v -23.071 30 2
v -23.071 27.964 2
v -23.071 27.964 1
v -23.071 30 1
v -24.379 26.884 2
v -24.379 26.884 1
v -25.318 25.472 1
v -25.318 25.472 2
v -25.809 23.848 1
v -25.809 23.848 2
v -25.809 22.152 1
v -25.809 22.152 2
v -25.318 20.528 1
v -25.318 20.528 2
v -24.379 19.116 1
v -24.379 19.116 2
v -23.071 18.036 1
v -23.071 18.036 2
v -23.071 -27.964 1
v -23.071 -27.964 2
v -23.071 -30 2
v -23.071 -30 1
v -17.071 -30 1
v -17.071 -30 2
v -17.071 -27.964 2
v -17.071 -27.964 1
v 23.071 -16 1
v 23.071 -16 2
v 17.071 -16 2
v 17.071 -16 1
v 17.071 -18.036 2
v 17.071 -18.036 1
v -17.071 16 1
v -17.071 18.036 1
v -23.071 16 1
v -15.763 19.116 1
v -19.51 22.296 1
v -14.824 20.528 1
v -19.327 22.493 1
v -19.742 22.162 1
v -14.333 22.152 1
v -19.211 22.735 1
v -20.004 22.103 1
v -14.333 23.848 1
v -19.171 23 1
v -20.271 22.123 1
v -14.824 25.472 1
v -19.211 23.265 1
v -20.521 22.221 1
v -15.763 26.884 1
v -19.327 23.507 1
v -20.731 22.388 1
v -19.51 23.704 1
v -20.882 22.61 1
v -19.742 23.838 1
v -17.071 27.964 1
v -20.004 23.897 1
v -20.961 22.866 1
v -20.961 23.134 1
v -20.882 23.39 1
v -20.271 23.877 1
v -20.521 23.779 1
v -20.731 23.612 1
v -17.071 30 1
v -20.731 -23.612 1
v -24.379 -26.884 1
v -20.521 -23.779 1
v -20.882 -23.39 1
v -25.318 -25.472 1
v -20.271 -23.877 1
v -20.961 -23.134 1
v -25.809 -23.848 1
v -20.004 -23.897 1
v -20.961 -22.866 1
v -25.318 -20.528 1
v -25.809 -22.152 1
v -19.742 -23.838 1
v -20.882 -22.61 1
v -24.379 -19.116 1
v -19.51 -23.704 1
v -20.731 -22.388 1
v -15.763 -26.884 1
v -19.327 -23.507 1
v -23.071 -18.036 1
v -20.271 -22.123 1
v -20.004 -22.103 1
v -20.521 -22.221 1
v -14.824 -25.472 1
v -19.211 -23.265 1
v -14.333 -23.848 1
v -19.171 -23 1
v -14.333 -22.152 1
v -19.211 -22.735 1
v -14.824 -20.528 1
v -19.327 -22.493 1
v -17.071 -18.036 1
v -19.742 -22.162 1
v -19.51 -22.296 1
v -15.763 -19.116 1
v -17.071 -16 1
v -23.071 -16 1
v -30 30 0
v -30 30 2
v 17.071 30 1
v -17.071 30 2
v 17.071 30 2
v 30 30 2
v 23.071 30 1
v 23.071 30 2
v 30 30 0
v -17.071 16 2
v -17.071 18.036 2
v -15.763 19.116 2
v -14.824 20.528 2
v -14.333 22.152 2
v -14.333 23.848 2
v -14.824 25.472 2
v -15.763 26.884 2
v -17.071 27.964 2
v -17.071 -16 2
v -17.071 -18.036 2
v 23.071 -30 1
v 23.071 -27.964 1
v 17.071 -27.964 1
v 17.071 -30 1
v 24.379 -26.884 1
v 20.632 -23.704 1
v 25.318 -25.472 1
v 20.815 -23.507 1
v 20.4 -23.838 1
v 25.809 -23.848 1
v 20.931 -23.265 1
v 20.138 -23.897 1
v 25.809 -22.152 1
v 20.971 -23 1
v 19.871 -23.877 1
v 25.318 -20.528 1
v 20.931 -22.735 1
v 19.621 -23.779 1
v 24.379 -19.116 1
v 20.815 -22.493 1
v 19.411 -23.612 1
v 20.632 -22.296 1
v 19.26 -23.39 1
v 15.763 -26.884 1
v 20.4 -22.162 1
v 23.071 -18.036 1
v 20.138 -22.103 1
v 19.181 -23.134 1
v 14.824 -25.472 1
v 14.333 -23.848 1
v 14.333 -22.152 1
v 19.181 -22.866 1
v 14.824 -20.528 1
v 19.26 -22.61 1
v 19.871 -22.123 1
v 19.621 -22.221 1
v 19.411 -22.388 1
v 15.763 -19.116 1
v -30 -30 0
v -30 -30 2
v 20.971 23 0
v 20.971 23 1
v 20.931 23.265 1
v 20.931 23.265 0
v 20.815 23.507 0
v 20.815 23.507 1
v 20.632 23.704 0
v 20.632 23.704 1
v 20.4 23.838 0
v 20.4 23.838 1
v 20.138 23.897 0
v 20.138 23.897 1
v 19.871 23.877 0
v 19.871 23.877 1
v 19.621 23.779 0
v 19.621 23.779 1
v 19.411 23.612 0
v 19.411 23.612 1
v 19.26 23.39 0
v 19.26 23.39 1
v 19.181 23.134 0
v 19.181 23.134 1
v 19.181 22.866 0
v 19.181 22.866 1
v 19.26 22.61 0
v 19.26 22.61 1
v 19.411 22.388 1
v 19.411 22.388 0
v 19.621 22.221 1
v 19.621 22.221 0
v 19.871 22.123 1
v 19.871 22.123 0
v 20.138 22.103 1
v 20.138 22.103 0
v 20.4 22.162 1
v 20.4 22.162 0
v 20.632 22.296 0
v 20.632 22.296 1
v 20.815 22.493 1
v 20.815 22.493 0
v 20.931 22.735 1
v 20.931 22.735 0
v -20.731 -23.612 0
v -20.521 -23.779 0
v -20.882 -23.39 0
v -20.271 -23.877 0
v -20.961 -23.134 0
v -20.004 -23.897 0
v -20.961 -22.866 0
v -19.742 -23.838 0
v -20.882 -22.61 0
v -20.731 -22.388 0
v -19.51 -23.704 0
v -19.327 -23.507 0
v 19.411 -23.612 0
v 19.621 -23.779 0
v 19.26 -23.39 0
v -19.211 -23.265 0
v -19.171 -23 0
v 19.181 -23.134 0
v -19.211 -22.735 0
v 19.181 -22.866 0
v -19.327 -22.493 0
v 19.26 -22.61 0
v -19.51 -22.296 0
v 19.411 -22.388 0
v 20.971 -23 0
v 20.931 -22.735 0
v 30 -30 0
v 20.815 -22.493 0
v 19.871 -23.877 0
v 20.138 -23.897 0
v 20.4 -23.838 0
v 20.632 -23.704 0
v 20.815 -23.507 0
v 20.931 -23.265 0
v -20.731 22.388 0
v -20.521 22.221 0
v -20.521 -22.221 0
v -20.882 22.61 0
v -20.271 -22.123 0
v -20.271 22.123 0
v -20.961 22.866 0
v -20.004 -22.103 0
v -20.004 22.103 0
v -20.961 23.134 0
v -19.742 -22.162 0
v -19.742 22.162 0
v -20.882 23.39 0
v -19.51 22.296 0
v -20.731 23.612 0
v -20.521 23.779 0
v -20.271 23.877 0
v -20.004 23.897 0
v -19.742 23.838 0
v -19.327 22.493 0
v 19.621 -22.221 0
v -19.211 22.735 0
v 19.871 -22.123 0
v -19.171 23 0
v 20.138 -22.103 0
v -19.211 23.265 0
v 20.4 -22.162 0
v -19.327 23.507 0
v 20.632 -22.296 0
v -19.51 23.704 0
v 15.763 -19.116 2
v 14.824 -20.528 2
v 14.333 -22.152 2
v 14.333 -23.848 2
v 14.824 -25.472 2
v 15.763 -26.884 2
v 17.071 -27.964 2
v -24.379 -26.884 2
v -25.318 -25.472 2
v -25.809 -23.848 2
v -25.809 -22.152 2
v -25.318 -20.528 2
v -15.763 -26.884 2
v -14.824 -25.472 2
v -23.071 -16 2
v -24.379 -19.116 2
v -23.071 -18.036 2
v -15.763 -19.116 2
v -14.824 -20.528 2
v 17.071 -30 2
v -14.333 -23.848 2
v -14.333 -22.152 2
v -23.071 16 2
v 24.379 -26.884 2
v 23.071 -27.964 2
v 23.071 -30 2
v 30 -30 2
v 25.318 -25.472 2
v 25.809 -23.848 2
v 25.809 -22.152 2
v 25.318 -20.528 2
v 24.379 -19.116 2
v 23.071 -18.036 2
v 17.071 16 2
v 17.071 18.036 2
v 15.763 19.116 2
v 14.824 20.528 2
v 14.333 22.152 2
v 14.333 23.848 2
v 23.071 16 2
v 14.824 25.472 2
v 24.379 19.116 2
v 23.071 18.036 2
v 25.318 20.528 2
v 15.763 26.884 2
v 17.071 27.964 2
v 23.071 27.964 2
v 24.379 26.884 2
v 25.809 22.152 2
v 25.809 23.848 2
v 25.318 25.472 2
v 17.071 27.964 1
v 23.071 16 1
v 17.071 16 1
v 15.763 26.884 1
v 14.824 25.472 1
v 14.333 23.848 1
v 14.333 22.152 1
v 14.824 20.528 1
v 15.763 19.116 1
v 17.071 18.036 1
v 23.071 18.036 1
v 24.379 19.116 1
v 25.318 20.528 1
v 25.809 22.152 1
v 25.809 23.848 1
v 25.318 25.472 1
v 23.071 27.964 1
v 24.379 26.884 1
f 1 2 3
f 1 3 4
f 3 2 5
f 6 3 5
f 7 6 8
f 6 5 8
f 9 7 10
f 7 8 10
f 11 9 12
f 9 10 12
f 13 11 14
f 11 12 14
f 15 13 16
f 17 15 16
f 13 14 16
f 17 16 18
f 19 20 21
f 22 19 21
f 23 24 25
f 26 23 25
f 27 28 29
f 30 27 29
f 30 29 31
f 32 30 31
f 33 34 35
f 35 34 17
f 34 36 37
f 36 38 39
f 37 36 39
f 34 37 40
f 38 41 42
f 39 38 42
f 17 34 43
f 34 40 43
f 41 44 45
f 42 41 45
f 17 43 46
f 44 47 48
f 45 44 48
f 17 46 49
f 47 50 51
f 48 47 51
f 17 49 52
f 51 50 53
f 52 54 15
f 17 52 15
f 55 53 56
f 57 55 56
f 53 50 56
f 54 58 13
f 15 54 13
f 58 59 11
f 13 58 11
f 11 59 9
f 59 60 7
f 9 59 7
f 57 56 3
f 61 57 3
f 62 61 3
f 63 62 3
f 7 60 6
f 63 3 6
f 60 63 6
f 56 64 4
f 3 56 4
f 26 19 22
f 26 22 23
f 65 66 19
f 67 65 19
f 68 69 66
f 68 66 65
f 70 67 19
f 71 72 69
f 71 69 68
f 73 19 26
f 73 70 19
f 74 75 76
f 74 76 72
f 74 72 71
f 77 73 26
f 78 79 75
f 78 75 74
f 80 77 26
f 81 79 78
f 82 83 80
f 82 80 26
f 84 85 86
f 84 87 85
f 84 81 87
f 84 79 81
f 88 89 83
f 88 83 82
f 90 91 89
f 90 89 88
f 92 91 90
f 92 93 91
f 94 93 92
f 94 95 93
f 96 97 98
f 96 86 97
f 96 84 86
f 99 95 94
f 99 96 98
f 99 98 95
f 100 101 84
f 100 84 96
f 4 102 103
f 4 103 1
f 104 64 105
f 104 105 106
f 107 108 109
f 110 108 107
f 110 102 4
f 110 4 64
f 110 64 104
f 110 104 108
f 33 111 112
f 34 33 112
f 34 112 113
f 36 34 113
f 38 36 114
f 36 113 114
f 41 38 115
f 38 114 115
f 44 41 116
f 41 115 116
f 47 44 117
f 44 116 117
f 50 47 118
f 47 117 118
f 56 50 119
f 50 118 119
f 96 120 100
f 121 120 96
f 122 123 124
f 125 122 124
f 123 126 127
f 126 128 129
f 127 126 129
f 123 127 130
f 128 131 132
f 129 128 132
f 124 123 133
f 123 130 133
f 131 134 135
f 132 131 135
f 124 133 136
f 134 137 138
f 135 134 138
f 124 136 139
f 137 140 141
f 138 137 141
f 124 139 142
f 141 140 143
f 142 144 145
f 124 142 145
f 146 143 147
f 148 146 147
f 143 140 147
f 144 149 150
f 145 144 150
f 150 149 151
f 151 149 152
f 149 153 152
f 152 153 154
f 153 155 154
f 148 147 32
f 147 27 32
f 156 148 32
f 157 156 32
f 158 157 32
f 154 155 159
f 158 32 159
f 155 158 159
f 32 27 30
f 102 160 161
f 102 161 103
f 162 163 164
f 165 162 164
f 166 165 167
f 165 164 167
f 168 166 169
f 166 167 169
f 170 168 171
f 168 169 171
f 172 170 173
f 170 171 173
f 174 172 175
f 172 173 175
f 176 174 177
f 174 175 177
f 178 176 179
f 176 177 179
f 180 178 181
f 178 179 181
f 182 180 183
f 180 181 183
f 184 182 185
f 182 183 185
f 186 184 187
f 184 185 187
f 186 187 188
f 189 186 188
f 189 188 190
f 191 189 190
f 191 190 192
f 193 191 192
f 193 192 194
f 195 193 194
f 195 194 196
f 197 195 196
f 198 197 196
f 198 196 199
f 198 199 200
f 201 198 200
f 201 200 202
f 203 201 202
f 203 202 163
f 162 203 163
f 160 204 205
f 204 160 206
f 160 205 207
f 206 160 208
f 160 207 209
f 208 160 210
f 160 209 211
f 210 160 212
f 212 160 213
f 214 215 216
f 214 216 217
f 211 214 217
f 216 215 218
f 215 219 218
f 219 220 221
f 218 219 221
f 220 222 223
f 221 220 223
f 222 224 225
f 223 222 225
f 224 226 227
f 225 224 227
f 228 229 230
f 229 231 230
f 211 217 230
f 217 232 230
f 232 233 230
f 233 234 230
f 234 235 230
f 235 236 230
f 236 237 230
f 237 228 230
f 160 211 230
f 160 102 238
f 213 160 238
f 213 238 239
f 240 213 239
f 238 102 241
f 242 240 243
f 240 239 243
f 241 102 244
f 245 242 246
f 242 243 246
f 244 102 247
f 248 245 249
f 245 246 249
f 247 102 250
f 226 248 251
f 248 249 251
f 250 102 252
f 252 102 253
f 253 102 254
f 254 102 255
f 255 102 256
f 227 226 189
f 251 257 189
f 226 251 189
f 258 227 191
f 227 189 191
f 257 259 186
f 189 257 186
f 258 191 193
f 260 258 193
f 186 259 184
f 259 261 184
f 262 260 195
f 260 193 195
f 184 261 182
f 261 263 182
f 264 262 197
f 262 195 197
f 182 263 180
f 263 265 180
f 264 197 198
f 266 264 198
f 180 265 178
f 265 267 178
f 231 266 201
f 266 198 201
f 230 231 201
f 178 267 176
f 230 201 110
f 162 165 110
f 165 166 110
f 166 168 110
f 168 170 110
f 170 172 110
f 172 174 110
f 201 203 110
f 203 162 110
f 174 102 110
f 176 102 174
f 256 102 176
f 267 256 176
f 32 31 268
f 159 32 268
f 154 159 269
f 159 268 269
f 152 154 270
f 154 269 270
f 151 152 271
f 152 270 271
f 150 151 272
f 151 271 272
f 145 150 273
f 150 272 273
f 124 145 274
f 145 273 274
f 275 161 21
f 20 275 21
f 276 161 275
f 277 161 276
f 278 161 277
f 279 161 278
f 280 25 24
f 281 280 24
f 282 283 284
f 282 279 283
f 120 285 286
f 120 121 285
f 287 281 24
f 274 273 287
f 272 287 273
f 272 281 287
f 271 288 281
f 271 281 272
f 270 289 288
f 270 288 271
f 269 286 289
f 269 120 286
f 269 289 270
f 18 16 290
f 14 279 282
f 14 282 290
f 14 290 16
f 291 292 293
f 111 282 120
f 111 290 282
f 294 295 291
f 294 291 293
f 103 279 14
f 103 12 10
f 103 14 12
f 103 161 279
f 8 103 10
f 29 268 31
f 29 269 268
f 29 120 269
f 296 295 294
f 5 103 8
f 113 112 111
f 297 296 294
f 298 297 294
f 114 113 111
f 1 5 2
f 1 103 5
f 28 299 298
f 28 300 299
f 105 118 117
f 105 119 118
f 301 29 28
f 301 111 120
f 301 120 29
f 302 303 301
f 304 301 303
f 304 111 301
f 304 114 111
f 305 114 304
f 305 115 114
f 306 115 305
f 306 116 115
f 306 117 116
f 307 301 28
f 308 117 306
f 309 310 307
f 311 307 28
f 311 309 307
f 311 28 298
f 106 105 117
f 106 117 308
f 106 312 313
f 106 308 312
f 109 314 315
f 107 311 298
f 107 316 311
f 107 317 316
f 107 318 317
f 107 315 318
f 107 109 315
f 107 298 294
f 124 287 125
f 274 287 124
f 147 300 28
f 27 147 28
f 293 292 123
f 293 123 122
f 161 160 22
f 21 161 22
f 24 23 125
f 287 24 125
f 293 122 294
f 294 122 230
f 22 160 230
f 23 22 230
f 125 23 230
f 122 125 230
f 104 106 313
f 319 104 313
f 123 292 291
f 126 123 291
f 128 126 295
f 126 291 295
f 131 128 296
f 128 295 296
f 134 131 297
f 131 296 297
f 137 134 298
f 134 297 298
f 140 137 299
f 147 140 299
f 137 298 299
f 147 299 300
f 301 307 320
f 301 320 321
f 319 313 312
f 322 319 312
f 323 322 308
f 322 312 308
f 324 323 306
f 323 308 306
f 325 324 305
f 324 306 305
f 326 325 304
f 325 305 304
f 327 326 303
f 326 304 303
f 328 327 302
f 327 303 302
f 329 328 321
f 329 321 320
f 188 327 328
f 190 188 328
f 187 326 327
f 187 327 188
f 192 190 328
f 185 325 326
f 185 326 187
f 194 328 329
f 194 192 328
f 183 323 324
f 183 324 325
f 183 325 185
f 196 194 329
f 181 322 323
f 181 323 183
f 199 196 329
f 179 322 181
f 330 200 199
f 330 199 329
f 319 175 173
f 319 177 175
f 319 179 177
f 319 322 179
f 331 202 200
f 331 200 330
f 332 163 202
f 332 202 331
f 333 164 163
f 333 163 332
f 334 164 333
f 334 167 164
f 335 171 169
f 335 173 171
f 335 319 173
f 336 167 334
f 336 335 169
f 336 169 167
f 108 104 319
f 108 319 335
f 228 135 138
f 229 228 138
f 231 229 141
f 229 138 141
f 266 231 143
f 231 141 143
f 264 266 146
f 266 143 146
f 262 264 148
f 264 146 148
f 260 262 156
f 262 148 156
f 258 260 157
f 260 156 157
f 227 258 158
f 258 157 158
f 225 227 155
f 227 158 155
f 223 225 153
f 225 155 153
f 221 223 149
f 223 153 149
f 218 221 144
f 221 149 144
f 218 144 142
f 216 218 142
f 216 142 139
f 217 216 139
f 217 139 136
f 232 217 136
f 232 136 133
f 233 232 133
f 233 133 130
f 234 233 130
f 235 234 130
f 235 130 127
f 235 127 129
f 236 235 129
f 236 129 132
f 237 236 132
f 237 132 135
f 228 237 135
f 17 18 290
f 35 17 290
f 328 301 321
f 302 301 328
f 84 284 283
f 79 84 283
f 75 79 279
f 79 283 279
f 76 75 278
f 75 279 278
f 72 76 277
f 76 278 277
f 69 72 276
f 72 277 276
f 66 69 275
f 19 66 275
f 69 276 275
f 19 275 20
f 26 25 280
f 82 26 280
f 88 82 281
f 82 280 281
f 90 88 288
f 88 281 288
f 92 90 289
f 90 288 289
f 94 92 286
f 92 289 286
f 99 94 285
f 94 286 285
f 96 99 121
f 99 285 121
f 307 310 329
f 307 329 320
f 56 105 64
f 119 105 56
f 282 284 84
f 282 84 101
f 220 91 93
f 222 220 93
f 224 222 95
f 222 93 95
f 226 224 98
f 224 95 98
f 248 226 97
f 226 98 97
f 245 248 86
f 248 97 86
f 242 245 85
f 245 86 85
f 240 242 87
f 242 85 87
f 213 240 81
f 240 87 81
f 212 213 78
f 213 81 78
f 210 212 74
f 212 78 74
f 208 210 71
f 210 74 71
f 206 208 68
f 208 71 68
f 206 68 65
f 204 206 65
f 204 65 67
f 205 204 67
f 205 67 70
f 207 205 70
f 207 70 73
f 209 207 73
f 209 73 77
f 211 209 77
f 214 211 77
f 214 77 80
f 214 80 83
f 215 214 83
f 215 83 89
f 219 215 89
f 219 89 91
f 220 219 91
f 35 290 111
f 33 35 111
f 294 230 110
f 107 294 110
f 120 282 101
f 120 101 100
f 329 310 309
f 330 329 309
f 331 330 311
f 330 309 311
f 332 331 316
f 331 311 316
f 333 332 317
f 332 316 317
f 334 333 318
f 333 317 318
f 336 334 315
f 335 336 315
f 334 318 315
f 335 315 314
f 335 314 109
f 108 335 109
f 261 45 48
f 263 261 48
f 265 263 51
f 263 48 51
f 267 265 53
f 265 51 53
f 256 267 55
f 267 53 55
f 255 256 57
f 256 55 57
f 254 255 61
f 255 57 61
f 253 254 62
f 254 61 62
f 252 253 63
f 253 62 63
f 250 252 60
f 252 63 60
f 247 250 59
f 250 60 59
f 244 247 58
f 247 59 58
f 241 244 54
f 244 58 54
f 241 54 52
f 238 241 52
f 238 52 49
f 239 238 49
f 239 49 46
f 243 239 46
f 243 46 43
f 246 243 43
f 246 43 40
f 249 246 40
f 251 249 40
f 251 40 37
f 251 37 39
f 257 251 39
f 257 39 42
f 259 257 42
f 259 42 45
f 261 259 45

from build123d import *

# Parameters (mm, degrees)
SKETCH_W        = 60
SKETCH_H        = 60
PAD_DEPTH       = 2
POCKET001_DEPTH = 1
SKETCH005_R     = 0.9
POCKET002_DEPTH = 5


with BuildPart() as part:
    # Sketch → Pad (new body)
    with BuildSketch(Plane.XY):
        Rectangle(SKETCH_W, SKETCH_H)
    extrude(amount=PAD_DEPTH)

    # Sketch004 (on Face6 of Pad) → Pocket001 (cut)
    with BuildSketch(Plane.XY.offset(2)):
        with BuildLine():
            Line((-23.070984, -27.963869), (-23.070984, -30))
            Line((-23.070984, -30), (-17.070984, -30))
            Line((-17.070984, -30), (-17.070984, -27.963869))
            ThreePointArc((-17.070984, -27.963869), (-14.270984, -23), (-17.070984, -18.036131))
            Line((-17.070984, -16), (-17.070984, -18.036131))
            Line((-23.070984, -16), (-17.070984, -16))
            Line((-23.070984, -18.036131), (-23.070984, -16))
            ThreePointArc((-23.070984, -18.036131), (-25.870984, -23), (-23.070984, -27.963869))
        make_face()
        with BuildLine():
            Line((23.070984, -27.963869), (23.070984, -30))
            Line((23.070984, -30), (17.070984, -30))
            Line((17.070984, -30), (17.070984, -27.963869))
            ThreePointArc((17.070984, -18.036131), (14.270984, -23), (17.070984, -27.963869))
            Line((17.070984, -16), (17.070984, -18.036131))
            Line((23.070984, -16), (17.070984, -16))
            Line((23.070984, -18.036131), (23.070984, -16))
            ThreePointArc((23.070984, -27.963869), (25.870984, -23), (23.070984, -18.036131))
        make_face()
        with BuildLine():
            Line((-23.070984, 27.963869), (-23.070984, 30))
            Line((-23.070984, 30), (-17.070984, 30))
            Line((-17.070984, 30), (-17.070984, 27.963869))
            ThreePointArc((-17.070984, 18.036131), (-14.270984, 23), (-17.070984, 27.963869))
            Line((-17.070984, 16), (-17.070984, 18.036131))
            Line((-23.070984, 16), (-17.070984, 16))
            Line((-23.070984, 18.036131), (-23.070984, 16))
            ThreePointArc((-23.070984, 27.963869), (-25.870984, 23), (-23.070984, 18.036131))
        make_face()
        with BuildLine():
            Line((23.070984, 27.963869), (23.070984, 30))
            Line((23.070984, 30), (17.070984, 30))
            Line((17.070984, 30), (17.070984, 27.963869))
            ThreePointArc((17.070984, 27.963869), (14.270984, 23), (17.070984, 18.036131))
            Line((17.070984, 16), (17.070984, 18.036131))
            Line((23.070984, 16), (17.070984, 16))
            Line((23.070984, 18.036131), (23.070984, 16))
            ThreePointArc((23.070984, 18.036131), (25.870984, 23), (23.070984, 27.963869))
        make_face()
    extrude(amount=-POCKET001_DEPTH, mode=Mode.SUBTRACT)

    # Sketch005 (on Face4 of Pocket001) → Pocket002 (cut)
    with BuildSketch(Plane.XY.offset(2)):
        with Locations((-20.070984, -23)):
            Circle(SKETCH005_R)
        with Locations((20.070984, -23)):
            Circle(SKETCH005_R)
        with Locations((-20.070984, 23)):
            Circle(SKETCH005_R)
        with Locations((20.070984, 23)):
            Circle(SKETCH005_R)
    extrude(amount=-POCKET002_DEPTH, mode=Mode.SUBTRACT)


solid = part.part
